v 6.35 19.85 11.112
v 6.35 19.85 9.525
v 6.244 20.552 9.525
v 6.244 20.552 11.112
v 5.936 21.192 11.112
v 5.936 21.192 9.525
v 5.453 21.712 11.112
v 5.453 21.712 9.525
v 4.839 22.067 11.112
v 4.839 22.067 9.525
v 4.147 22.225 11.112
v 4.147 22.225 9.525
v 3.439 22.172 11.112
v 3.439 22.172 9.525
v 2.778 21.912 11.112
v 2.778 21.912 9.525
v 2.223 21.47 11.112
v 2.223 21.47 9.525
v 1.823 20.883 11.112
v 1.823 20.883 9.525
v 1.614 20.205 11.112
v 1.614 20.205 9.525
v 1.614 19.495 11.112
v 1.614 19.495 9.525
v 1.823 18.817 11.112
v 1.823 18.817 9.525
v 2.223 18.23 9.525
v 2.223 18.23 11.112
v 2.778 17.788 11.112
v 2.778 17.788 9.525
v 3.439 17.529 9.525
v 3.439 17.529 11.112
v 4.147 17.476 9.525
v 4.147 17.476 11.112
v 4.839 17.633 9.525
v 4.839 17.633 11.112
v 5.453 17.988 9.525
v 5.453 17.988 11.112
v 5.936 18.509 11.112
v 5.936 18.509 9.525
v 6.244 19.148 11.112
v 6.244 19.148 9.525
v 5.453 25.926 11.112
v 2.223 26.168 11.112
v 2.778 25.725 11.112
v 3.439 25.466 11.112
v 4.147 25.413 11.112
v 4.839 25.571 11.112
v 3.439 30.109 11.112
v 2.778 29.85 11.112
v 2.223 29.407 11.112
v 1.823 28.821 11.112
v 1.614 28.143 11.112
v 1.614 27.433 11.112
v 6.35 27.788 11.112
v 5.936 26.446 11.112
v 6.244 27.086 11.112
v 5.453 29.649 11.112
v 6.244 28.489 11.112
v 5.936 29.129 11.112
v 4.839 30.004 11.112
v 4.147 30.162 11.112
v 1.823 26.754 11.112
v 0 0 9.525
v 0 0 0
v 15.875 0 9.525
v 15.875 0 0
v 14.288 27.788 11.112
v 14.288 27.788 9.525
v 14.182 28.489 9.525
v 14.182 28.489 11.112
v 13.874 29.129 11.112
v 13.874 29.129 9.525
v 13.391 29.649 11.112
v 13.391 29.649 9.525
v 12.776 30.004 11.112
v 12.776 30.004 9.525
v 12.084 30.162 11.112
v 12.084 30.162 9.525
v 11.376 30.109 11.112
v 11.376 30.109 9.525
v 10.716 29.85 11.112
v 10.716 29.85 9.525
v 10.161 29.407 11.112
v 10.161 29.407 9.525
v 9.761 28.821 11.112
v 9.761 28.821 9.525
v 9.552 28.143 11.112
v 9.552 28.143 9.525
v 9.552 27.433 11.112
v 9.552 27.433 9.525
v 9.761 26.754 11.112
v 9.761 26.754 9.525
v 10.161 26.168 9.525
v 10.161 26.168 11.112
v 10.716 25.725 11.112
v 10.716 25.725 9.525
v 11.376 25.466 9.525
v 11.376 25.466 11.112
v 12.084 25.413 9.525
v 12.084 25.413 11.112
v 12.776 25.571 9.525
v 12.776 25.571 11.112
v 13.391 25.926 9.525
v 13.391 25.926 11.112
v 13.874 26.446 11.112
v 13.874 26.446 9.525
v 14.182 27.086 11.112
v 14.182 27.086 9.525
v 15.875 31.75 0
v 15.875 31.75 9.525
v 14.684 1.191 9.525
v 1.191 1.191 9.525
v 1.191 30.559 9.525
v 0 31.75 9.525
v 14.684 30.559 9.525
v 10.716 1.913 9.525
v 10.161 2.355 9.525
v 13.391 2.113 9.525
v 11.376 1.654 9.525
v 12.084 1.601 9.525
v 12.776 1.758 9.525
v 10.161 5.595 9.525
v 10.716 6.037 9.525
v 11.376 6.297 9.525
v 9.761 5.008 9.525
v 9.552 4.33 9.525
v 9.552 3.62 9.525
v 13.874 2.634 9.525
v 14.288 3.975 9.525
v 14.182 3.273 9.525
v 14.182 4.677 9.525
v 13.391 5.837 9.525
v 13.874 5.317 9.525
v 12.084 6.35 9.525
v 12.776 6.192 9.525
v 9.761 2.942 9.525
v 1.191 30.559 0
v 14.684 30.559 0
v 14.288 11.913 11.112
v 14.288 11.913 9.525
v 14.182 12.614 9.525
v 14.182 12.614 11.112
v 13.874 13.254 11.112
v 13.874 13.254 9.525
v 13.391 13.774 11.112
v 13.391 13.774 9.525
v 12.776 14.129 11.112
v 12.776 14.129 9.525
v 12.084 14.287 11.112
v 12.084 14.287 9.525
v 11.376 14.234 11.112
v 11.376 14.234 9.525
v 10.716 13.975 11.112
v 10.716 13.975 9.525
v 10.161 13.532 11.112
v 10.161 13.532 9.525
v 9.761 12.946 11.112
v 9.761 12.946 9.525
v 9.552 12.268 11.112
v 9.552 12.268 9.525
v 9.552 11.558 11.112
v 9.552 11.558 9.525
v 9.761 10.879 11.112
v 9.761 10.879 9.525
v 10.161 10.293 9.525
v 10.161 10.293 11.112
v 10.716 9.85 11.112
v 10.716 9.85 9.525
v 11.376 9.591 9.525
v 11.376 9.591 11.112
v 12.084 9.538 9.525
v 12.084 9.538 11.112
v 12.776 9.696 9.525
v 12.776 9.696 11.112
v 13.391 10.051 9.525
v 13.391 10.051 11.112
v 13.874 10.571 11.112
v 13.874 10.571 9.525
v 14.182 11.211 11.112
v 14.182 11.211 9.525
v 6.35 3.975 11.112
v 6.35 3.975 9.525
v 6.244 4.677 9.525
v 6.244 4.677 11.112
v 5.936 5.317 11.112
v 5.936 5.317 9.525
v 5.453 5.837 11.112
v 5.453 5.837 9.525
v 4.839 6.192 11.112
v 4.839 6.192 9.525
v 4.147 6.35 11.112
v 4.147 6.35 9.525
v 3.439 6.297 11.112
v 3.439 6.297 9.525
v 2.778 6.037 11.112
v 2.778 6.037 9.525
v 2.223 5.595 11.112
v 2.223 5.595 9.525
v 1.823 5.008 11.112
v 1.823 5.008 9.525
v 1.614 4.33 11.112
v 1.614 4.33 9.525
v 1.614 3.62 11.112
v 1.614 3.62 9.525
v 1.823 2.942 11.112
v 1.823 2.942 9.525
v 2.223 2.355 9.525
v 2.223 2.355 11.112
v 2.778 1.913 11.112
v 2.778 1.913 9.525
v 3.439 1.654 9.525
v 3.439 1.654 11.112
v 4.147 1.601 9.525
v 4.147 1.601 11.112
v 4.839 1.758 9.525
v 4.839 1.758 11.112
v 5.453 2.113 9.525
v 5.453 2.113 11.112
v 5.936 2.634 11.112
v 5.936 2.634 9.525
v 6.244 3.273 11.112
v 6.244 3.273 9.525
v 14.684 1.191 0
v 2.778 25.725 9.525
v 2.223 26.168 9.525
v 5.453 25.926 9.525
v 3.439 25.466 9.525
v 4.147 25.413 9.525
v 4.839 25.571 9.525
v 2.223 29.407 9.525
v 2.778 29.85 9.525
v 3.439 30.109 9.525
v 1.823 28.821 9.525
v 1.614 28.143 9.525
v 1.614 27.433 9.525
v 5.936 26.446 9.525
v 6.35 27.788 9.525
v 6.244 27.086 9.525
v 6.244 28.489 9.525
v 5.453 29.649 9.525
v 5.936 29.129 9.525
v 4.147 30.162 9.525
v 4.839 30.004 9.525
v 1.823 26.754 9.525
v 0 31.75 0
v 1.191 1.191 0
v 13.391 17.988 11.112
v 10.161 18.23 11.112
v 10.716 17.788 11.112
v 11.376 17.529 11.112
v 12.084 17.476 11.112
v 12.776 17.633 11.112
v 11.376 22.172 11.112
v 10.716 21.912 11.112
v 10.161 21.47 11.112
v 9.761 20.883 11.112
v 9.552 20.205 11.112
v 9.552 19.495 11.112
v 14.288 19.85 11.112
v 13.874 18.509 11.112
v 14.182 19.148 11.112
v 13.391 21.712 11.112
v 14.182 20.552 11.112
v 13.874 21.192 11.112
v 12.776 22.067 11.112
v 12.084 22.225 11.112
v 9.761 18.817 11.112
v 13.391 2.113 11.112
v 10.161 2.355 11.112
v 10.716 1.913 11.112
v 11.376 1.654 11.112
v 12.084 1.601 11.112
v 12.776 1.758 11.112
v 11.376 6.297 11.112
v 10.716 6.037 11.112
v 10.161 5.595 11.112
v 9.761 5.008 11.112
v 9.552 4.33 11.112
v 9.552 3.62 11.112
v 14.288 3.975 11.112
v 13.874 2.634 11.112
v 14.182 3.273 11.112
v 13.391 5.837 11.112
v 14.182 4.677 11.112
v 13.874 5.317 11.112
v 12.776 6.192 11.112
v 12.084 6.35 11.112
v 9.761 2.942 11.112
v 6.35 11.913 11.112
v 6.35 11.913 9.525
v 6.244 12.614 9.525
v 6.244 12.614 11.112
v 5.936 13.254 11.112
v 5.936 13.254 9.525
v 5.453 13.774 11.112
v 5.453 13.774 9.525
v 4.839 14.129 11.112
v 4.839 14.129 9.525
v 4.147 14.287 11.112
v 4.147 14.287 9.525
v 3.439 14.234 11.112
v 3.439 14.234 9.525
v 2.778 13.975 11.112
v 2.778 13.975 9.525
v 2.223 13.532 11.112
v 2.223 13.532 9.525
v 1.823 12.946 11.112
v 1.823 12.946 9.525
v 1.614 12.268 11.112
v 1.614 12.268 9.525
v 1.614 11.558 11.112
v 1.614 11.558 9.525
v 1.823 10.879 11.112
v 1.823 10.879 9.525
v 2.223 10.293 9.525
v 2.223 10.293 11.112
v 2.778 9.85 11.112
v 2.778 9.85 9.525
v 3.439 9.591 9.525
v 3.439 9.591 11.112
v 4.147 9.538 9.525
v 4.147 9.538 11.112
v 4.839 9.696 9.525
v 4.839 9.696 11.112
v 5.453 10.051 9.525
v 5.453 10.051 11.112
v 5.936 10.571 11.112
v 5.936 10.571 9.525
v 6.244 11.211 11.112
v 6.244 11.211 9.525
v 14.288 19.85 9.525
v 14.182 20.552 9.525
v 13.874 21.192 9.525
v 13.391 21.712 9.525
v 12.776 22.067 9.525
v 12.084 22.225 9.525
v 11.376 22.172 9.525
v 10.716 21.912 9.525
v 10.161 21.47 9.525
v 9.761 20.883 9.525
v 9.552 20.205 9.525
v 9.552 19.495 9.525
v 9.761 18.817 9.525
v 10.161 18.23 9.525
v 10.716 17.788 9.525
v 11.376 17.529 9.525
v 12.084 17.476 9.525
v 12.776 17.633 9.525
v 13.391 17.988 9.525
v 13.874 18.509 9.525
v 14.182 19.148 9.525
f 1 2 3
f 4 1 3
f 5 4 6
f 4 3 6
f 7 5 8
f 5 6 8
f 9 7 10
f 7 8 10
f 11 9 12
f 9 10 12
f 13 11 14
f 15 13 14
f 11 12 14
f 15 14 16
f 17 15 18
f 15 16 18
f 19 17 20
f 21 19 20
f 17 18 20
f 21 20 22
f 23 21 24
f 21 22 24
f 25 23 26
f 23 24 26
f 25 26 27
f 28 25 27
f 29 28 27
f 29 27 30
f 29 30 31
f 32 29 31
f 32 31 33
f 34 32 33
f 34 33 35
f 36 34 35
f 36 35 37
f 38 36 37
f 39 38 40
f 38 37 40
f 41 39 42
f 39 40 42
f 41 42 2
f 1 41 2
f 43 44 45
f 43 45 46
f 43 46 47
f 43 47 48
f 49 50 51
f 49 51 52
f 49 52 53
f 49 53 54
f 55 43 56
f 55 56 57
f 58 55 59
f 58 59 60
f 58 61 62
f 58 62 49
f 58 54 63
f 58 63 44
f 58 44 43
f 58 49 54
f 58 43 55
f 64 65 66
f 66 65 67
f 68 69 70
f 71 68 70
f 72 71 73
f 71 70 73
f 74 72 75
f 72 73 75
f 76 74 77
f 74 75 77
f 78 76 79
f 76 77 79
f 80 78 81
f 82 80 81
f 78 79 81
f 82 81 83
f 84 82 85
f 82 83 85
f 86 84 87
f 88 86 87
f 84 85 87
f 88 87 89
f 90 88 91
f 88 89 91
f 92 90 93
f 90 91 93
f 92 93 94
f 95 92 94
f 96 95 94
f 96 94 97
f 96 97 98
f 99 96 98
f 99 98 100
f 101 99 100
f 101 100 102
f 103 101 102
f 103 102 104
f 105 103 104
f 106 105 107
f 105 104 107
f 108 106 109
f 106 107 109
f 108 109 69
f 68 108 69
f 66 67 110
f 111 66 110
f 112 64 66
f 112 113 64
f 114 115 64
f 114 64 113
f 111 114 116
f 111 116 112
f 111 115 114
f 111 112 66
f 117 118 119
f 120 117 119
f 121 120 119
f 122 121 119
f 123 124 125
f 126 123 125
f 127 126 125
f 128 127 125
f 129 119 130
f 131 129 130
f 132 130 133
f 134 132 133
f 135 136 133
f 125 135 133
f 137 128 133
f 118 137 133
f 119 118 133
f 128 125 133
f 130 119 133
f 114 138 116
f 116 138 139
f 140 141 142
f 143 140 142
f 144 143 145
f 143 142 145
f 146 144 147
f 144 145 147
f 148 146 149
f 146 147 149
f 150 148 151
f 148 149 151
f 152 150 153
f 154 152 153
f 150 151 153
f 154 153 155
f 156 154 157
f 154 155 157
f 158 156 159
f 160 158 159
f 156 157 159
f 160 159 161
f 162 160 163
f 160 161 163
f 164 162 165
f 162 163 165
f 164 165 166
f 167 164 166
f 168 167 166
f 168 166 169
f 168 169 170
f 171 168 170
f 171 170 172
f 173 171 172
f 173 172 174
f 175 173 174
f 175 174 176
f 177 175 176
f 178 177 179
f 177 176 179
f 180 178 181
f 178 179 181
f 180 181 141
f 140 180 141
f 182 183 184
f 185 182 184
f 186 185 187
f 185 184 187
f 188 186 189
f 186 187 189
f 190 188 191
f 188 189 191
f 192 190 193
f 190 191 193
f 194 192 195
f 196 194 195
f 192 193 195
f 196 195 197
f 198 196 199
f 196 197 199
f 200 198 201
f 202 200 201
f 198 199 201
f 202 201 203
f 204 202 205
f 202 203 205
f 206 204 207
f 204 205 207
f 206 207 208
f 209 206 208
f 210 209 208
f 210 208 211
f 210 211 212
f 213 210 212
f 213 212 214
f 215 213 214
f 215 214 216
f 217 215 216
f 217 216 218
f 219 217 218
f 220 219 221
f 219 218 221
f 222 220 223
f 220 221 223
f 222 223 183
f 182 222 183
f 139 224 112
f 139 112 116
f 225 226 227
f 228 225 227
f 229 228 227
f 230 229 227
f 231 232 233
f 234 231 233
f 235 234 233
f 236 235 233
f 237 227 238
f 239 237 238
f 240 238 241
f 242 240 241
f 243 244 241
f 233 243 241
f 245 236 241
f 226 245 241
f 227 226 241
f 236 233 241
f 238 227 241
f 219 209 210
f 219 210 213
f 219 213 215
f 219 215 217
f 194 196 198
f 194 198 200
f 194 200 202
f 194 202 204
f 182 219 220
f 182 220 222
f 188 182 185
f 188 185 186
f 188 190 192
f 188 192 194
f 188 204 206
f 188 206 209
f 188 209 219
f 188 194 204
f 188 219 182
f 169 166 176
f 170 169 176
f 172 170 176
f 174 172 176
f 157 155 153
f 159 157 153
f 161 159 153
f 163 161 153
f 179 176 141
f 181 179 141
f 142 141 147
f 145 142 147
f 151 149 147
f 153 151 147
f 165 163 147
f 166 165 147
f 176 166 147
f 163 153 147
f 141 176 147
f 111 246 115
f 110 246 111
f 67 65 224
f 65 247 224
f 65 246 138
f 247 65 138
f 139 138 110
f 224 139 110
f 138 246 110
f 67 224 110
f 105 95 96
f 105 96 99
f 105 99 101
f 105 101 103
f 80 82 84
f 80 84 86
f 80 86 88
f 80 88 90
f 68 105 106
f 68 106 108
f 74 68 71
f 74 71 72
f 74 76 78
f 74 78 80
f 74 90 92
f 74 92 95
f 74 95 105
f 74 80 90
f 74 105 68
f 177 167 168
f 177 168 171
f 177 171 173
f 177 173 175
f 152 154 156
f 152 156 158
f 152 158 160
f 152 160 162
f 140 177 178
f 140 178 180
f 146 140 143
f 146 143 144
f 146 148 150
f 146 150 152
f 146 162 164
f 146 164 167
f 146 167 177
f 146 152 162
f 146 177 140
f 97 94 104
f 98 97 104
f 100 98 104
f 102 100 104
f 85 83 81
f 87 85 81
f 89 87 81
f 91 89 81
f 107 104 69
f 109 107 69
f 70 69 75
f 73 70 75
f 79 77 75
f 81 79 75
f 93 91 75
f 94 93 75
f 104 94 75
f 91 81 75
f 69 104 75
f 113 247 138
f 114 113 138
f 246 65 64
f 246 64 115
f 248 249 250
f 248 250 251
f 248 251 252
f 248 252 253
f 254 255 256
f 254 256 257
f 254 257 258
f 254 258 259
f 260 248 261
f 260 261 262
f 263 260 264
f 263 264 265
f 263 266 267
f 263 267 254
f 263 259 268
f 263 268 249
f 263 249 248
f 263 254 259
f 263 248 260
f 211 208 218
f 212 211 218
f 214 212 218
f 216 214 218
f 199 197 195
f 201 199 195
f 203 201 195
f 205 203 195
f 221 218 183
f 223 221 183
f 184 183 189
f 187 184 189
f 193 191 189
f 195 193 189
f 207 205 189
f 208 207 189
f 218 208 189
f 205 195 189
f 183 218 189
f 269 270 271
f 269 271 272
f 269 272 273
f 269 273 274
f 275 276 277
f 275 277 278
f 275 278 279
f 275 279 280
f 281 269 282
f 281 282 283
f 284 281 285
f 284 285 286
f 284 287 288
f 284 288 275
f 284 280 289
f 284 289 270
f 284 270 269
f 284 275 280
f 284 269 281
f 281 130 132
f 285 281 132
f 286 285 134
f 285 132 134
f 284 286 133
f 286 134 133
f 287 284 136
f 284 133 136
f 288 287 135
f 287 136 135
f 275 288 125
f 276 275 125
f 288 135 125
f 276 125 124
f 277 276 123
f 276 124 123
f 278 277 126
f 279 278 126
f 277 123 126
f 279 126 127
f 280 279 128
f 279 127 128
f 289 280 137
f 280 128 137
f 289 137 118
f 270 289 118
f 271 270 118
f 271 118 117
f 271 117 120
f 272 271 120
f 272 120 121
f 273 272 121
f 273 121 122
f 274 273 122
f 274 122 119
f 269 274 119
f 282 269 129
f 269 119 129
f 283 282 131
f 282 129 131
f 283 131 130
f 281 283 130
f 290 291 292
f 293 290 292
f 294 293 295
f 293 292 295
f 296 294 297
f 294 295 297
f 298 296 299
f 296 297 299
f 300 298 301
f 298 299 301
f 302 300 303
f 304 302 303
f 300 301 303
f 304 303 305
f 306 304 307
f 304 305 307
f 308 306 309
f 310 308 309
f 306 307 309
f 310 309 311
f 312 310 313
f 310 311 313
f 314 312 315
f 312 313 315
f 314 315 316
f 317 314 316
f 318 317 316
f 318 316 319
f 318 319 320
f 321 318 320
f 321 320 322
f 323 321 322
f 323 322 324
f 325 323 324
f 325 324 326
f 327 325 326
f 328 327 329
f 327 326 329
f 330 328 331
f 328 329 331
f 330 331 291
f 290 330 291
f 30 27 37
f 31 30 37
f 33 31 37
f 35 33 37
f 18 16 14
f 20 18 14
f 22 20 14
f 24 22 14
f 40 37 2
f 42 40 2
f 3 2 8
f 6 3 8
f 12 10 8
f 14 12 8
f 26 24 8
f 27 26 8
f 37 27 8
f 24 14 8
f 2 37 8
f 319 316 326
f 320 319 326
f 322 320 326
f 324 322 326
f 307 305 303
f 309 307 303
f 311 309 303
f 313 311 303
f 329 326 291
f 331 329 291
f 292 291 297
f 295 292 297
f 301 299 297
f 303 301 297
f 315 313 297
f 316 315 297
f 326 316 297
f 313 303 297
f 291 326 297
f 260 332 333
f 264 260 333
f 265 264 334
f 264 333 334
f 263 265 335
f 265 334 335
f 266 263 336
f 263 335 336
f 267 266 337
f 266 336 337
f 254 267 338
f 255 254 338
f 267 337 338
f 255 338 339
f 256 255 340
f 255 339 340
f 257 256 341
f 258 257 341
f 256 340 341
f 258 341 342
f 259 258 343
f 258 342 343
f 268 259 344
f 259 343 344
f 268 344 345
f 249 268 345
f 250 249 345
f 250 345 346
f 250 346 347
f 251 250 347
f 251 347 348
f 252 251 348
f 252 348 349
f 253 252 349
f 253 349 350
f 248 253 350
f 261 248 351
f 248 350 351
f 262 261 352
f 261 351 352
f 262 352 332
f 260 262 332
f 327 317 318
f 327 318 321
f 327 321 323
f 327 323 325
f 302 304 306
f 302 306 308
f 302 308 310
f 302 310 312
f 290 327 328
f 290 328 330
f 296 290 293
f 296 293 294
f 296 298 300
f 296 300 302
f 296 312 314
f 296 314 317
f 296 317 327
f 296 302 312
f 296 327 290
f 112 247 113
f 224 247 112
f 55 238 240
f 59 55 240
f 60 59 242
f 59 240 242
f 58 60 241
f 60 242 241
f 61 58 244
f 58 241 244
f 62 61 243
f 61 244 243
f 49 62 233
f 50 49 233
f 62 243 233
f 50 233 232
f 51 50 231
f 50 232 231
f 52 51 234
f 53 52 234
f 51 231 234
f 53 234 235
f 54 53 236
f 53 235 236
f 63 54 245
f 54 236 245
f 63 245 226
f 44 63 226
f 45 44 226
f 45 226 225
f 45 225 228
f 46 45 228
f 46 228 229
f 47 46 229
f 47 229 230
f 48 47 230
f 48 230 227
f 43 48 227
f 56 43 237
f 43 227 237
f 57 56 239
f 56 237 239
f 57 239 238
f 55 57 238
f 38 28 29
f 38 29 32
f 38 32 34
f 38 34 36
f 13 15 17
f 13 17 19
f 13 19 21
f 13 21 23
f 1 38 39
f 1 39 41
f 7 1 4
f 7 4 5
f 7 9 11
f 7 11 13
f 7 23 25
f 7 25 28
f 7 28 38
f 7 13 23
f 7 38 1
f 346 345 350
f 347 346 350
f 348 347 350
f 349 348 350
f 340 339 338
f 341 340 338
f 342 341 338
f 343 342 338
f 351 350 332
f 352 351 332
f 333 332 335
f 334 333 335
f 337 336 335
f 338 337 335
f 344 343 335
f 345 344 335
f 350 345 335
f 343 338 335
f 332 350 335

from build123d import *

# Parameters (mm, degrees)
F0_W     = 15.875
F0_H     = 31.75
F0_W_2   = 13.49375
F0_H_2   = 29.36875
F1_DEPTH = 9.525
F2_R     = 2.38125
F3_DEPTH = 1.5875


with BuildPart() as f1:
    # F0 (on Top) → F1 (new body)
    with BuildSketch(Plane.XY):
        with Locations((7.9375, 15.875)):
            Rectangle(F0_W, F0_H)
        with Locations((7.9375, 15.875)):
            Rectangle(F0_W_2, F0_H_2, mode=Mode.SUBTRACT)
    extrude(amount=F1_DEPTH)


with BuildPart() as f3:
    # F2 (on face) → F3 (new body)
    with BuildSketch(Plane.XY.offset(9.525)):
        with Locations((3.96875, 27.7876)):
            Circle(F2_R)
        with Locations((11.90625, 27.7876)):
            Circle(F2_R)
        with Locations((3.96875, 19.8501)):
            Circle(F2_R)
        with Locations((11.90625, 19.8501)):
            Circle(F2_R)
        with Locations((3.96875, 11.9126)):
            Circle(F2_R)
        with Locations((11.90625, 11.9126)):
            Circle(F2_R)
        with Locations((3.96875, 3.9751)):
            Circle(F2_R)
        with Locations((11.90625, 3.9751)):
            Circle(F2_R)
    extrude(amount=F3_DEPTH)


solid = Compound([f1.part, f3.part])
